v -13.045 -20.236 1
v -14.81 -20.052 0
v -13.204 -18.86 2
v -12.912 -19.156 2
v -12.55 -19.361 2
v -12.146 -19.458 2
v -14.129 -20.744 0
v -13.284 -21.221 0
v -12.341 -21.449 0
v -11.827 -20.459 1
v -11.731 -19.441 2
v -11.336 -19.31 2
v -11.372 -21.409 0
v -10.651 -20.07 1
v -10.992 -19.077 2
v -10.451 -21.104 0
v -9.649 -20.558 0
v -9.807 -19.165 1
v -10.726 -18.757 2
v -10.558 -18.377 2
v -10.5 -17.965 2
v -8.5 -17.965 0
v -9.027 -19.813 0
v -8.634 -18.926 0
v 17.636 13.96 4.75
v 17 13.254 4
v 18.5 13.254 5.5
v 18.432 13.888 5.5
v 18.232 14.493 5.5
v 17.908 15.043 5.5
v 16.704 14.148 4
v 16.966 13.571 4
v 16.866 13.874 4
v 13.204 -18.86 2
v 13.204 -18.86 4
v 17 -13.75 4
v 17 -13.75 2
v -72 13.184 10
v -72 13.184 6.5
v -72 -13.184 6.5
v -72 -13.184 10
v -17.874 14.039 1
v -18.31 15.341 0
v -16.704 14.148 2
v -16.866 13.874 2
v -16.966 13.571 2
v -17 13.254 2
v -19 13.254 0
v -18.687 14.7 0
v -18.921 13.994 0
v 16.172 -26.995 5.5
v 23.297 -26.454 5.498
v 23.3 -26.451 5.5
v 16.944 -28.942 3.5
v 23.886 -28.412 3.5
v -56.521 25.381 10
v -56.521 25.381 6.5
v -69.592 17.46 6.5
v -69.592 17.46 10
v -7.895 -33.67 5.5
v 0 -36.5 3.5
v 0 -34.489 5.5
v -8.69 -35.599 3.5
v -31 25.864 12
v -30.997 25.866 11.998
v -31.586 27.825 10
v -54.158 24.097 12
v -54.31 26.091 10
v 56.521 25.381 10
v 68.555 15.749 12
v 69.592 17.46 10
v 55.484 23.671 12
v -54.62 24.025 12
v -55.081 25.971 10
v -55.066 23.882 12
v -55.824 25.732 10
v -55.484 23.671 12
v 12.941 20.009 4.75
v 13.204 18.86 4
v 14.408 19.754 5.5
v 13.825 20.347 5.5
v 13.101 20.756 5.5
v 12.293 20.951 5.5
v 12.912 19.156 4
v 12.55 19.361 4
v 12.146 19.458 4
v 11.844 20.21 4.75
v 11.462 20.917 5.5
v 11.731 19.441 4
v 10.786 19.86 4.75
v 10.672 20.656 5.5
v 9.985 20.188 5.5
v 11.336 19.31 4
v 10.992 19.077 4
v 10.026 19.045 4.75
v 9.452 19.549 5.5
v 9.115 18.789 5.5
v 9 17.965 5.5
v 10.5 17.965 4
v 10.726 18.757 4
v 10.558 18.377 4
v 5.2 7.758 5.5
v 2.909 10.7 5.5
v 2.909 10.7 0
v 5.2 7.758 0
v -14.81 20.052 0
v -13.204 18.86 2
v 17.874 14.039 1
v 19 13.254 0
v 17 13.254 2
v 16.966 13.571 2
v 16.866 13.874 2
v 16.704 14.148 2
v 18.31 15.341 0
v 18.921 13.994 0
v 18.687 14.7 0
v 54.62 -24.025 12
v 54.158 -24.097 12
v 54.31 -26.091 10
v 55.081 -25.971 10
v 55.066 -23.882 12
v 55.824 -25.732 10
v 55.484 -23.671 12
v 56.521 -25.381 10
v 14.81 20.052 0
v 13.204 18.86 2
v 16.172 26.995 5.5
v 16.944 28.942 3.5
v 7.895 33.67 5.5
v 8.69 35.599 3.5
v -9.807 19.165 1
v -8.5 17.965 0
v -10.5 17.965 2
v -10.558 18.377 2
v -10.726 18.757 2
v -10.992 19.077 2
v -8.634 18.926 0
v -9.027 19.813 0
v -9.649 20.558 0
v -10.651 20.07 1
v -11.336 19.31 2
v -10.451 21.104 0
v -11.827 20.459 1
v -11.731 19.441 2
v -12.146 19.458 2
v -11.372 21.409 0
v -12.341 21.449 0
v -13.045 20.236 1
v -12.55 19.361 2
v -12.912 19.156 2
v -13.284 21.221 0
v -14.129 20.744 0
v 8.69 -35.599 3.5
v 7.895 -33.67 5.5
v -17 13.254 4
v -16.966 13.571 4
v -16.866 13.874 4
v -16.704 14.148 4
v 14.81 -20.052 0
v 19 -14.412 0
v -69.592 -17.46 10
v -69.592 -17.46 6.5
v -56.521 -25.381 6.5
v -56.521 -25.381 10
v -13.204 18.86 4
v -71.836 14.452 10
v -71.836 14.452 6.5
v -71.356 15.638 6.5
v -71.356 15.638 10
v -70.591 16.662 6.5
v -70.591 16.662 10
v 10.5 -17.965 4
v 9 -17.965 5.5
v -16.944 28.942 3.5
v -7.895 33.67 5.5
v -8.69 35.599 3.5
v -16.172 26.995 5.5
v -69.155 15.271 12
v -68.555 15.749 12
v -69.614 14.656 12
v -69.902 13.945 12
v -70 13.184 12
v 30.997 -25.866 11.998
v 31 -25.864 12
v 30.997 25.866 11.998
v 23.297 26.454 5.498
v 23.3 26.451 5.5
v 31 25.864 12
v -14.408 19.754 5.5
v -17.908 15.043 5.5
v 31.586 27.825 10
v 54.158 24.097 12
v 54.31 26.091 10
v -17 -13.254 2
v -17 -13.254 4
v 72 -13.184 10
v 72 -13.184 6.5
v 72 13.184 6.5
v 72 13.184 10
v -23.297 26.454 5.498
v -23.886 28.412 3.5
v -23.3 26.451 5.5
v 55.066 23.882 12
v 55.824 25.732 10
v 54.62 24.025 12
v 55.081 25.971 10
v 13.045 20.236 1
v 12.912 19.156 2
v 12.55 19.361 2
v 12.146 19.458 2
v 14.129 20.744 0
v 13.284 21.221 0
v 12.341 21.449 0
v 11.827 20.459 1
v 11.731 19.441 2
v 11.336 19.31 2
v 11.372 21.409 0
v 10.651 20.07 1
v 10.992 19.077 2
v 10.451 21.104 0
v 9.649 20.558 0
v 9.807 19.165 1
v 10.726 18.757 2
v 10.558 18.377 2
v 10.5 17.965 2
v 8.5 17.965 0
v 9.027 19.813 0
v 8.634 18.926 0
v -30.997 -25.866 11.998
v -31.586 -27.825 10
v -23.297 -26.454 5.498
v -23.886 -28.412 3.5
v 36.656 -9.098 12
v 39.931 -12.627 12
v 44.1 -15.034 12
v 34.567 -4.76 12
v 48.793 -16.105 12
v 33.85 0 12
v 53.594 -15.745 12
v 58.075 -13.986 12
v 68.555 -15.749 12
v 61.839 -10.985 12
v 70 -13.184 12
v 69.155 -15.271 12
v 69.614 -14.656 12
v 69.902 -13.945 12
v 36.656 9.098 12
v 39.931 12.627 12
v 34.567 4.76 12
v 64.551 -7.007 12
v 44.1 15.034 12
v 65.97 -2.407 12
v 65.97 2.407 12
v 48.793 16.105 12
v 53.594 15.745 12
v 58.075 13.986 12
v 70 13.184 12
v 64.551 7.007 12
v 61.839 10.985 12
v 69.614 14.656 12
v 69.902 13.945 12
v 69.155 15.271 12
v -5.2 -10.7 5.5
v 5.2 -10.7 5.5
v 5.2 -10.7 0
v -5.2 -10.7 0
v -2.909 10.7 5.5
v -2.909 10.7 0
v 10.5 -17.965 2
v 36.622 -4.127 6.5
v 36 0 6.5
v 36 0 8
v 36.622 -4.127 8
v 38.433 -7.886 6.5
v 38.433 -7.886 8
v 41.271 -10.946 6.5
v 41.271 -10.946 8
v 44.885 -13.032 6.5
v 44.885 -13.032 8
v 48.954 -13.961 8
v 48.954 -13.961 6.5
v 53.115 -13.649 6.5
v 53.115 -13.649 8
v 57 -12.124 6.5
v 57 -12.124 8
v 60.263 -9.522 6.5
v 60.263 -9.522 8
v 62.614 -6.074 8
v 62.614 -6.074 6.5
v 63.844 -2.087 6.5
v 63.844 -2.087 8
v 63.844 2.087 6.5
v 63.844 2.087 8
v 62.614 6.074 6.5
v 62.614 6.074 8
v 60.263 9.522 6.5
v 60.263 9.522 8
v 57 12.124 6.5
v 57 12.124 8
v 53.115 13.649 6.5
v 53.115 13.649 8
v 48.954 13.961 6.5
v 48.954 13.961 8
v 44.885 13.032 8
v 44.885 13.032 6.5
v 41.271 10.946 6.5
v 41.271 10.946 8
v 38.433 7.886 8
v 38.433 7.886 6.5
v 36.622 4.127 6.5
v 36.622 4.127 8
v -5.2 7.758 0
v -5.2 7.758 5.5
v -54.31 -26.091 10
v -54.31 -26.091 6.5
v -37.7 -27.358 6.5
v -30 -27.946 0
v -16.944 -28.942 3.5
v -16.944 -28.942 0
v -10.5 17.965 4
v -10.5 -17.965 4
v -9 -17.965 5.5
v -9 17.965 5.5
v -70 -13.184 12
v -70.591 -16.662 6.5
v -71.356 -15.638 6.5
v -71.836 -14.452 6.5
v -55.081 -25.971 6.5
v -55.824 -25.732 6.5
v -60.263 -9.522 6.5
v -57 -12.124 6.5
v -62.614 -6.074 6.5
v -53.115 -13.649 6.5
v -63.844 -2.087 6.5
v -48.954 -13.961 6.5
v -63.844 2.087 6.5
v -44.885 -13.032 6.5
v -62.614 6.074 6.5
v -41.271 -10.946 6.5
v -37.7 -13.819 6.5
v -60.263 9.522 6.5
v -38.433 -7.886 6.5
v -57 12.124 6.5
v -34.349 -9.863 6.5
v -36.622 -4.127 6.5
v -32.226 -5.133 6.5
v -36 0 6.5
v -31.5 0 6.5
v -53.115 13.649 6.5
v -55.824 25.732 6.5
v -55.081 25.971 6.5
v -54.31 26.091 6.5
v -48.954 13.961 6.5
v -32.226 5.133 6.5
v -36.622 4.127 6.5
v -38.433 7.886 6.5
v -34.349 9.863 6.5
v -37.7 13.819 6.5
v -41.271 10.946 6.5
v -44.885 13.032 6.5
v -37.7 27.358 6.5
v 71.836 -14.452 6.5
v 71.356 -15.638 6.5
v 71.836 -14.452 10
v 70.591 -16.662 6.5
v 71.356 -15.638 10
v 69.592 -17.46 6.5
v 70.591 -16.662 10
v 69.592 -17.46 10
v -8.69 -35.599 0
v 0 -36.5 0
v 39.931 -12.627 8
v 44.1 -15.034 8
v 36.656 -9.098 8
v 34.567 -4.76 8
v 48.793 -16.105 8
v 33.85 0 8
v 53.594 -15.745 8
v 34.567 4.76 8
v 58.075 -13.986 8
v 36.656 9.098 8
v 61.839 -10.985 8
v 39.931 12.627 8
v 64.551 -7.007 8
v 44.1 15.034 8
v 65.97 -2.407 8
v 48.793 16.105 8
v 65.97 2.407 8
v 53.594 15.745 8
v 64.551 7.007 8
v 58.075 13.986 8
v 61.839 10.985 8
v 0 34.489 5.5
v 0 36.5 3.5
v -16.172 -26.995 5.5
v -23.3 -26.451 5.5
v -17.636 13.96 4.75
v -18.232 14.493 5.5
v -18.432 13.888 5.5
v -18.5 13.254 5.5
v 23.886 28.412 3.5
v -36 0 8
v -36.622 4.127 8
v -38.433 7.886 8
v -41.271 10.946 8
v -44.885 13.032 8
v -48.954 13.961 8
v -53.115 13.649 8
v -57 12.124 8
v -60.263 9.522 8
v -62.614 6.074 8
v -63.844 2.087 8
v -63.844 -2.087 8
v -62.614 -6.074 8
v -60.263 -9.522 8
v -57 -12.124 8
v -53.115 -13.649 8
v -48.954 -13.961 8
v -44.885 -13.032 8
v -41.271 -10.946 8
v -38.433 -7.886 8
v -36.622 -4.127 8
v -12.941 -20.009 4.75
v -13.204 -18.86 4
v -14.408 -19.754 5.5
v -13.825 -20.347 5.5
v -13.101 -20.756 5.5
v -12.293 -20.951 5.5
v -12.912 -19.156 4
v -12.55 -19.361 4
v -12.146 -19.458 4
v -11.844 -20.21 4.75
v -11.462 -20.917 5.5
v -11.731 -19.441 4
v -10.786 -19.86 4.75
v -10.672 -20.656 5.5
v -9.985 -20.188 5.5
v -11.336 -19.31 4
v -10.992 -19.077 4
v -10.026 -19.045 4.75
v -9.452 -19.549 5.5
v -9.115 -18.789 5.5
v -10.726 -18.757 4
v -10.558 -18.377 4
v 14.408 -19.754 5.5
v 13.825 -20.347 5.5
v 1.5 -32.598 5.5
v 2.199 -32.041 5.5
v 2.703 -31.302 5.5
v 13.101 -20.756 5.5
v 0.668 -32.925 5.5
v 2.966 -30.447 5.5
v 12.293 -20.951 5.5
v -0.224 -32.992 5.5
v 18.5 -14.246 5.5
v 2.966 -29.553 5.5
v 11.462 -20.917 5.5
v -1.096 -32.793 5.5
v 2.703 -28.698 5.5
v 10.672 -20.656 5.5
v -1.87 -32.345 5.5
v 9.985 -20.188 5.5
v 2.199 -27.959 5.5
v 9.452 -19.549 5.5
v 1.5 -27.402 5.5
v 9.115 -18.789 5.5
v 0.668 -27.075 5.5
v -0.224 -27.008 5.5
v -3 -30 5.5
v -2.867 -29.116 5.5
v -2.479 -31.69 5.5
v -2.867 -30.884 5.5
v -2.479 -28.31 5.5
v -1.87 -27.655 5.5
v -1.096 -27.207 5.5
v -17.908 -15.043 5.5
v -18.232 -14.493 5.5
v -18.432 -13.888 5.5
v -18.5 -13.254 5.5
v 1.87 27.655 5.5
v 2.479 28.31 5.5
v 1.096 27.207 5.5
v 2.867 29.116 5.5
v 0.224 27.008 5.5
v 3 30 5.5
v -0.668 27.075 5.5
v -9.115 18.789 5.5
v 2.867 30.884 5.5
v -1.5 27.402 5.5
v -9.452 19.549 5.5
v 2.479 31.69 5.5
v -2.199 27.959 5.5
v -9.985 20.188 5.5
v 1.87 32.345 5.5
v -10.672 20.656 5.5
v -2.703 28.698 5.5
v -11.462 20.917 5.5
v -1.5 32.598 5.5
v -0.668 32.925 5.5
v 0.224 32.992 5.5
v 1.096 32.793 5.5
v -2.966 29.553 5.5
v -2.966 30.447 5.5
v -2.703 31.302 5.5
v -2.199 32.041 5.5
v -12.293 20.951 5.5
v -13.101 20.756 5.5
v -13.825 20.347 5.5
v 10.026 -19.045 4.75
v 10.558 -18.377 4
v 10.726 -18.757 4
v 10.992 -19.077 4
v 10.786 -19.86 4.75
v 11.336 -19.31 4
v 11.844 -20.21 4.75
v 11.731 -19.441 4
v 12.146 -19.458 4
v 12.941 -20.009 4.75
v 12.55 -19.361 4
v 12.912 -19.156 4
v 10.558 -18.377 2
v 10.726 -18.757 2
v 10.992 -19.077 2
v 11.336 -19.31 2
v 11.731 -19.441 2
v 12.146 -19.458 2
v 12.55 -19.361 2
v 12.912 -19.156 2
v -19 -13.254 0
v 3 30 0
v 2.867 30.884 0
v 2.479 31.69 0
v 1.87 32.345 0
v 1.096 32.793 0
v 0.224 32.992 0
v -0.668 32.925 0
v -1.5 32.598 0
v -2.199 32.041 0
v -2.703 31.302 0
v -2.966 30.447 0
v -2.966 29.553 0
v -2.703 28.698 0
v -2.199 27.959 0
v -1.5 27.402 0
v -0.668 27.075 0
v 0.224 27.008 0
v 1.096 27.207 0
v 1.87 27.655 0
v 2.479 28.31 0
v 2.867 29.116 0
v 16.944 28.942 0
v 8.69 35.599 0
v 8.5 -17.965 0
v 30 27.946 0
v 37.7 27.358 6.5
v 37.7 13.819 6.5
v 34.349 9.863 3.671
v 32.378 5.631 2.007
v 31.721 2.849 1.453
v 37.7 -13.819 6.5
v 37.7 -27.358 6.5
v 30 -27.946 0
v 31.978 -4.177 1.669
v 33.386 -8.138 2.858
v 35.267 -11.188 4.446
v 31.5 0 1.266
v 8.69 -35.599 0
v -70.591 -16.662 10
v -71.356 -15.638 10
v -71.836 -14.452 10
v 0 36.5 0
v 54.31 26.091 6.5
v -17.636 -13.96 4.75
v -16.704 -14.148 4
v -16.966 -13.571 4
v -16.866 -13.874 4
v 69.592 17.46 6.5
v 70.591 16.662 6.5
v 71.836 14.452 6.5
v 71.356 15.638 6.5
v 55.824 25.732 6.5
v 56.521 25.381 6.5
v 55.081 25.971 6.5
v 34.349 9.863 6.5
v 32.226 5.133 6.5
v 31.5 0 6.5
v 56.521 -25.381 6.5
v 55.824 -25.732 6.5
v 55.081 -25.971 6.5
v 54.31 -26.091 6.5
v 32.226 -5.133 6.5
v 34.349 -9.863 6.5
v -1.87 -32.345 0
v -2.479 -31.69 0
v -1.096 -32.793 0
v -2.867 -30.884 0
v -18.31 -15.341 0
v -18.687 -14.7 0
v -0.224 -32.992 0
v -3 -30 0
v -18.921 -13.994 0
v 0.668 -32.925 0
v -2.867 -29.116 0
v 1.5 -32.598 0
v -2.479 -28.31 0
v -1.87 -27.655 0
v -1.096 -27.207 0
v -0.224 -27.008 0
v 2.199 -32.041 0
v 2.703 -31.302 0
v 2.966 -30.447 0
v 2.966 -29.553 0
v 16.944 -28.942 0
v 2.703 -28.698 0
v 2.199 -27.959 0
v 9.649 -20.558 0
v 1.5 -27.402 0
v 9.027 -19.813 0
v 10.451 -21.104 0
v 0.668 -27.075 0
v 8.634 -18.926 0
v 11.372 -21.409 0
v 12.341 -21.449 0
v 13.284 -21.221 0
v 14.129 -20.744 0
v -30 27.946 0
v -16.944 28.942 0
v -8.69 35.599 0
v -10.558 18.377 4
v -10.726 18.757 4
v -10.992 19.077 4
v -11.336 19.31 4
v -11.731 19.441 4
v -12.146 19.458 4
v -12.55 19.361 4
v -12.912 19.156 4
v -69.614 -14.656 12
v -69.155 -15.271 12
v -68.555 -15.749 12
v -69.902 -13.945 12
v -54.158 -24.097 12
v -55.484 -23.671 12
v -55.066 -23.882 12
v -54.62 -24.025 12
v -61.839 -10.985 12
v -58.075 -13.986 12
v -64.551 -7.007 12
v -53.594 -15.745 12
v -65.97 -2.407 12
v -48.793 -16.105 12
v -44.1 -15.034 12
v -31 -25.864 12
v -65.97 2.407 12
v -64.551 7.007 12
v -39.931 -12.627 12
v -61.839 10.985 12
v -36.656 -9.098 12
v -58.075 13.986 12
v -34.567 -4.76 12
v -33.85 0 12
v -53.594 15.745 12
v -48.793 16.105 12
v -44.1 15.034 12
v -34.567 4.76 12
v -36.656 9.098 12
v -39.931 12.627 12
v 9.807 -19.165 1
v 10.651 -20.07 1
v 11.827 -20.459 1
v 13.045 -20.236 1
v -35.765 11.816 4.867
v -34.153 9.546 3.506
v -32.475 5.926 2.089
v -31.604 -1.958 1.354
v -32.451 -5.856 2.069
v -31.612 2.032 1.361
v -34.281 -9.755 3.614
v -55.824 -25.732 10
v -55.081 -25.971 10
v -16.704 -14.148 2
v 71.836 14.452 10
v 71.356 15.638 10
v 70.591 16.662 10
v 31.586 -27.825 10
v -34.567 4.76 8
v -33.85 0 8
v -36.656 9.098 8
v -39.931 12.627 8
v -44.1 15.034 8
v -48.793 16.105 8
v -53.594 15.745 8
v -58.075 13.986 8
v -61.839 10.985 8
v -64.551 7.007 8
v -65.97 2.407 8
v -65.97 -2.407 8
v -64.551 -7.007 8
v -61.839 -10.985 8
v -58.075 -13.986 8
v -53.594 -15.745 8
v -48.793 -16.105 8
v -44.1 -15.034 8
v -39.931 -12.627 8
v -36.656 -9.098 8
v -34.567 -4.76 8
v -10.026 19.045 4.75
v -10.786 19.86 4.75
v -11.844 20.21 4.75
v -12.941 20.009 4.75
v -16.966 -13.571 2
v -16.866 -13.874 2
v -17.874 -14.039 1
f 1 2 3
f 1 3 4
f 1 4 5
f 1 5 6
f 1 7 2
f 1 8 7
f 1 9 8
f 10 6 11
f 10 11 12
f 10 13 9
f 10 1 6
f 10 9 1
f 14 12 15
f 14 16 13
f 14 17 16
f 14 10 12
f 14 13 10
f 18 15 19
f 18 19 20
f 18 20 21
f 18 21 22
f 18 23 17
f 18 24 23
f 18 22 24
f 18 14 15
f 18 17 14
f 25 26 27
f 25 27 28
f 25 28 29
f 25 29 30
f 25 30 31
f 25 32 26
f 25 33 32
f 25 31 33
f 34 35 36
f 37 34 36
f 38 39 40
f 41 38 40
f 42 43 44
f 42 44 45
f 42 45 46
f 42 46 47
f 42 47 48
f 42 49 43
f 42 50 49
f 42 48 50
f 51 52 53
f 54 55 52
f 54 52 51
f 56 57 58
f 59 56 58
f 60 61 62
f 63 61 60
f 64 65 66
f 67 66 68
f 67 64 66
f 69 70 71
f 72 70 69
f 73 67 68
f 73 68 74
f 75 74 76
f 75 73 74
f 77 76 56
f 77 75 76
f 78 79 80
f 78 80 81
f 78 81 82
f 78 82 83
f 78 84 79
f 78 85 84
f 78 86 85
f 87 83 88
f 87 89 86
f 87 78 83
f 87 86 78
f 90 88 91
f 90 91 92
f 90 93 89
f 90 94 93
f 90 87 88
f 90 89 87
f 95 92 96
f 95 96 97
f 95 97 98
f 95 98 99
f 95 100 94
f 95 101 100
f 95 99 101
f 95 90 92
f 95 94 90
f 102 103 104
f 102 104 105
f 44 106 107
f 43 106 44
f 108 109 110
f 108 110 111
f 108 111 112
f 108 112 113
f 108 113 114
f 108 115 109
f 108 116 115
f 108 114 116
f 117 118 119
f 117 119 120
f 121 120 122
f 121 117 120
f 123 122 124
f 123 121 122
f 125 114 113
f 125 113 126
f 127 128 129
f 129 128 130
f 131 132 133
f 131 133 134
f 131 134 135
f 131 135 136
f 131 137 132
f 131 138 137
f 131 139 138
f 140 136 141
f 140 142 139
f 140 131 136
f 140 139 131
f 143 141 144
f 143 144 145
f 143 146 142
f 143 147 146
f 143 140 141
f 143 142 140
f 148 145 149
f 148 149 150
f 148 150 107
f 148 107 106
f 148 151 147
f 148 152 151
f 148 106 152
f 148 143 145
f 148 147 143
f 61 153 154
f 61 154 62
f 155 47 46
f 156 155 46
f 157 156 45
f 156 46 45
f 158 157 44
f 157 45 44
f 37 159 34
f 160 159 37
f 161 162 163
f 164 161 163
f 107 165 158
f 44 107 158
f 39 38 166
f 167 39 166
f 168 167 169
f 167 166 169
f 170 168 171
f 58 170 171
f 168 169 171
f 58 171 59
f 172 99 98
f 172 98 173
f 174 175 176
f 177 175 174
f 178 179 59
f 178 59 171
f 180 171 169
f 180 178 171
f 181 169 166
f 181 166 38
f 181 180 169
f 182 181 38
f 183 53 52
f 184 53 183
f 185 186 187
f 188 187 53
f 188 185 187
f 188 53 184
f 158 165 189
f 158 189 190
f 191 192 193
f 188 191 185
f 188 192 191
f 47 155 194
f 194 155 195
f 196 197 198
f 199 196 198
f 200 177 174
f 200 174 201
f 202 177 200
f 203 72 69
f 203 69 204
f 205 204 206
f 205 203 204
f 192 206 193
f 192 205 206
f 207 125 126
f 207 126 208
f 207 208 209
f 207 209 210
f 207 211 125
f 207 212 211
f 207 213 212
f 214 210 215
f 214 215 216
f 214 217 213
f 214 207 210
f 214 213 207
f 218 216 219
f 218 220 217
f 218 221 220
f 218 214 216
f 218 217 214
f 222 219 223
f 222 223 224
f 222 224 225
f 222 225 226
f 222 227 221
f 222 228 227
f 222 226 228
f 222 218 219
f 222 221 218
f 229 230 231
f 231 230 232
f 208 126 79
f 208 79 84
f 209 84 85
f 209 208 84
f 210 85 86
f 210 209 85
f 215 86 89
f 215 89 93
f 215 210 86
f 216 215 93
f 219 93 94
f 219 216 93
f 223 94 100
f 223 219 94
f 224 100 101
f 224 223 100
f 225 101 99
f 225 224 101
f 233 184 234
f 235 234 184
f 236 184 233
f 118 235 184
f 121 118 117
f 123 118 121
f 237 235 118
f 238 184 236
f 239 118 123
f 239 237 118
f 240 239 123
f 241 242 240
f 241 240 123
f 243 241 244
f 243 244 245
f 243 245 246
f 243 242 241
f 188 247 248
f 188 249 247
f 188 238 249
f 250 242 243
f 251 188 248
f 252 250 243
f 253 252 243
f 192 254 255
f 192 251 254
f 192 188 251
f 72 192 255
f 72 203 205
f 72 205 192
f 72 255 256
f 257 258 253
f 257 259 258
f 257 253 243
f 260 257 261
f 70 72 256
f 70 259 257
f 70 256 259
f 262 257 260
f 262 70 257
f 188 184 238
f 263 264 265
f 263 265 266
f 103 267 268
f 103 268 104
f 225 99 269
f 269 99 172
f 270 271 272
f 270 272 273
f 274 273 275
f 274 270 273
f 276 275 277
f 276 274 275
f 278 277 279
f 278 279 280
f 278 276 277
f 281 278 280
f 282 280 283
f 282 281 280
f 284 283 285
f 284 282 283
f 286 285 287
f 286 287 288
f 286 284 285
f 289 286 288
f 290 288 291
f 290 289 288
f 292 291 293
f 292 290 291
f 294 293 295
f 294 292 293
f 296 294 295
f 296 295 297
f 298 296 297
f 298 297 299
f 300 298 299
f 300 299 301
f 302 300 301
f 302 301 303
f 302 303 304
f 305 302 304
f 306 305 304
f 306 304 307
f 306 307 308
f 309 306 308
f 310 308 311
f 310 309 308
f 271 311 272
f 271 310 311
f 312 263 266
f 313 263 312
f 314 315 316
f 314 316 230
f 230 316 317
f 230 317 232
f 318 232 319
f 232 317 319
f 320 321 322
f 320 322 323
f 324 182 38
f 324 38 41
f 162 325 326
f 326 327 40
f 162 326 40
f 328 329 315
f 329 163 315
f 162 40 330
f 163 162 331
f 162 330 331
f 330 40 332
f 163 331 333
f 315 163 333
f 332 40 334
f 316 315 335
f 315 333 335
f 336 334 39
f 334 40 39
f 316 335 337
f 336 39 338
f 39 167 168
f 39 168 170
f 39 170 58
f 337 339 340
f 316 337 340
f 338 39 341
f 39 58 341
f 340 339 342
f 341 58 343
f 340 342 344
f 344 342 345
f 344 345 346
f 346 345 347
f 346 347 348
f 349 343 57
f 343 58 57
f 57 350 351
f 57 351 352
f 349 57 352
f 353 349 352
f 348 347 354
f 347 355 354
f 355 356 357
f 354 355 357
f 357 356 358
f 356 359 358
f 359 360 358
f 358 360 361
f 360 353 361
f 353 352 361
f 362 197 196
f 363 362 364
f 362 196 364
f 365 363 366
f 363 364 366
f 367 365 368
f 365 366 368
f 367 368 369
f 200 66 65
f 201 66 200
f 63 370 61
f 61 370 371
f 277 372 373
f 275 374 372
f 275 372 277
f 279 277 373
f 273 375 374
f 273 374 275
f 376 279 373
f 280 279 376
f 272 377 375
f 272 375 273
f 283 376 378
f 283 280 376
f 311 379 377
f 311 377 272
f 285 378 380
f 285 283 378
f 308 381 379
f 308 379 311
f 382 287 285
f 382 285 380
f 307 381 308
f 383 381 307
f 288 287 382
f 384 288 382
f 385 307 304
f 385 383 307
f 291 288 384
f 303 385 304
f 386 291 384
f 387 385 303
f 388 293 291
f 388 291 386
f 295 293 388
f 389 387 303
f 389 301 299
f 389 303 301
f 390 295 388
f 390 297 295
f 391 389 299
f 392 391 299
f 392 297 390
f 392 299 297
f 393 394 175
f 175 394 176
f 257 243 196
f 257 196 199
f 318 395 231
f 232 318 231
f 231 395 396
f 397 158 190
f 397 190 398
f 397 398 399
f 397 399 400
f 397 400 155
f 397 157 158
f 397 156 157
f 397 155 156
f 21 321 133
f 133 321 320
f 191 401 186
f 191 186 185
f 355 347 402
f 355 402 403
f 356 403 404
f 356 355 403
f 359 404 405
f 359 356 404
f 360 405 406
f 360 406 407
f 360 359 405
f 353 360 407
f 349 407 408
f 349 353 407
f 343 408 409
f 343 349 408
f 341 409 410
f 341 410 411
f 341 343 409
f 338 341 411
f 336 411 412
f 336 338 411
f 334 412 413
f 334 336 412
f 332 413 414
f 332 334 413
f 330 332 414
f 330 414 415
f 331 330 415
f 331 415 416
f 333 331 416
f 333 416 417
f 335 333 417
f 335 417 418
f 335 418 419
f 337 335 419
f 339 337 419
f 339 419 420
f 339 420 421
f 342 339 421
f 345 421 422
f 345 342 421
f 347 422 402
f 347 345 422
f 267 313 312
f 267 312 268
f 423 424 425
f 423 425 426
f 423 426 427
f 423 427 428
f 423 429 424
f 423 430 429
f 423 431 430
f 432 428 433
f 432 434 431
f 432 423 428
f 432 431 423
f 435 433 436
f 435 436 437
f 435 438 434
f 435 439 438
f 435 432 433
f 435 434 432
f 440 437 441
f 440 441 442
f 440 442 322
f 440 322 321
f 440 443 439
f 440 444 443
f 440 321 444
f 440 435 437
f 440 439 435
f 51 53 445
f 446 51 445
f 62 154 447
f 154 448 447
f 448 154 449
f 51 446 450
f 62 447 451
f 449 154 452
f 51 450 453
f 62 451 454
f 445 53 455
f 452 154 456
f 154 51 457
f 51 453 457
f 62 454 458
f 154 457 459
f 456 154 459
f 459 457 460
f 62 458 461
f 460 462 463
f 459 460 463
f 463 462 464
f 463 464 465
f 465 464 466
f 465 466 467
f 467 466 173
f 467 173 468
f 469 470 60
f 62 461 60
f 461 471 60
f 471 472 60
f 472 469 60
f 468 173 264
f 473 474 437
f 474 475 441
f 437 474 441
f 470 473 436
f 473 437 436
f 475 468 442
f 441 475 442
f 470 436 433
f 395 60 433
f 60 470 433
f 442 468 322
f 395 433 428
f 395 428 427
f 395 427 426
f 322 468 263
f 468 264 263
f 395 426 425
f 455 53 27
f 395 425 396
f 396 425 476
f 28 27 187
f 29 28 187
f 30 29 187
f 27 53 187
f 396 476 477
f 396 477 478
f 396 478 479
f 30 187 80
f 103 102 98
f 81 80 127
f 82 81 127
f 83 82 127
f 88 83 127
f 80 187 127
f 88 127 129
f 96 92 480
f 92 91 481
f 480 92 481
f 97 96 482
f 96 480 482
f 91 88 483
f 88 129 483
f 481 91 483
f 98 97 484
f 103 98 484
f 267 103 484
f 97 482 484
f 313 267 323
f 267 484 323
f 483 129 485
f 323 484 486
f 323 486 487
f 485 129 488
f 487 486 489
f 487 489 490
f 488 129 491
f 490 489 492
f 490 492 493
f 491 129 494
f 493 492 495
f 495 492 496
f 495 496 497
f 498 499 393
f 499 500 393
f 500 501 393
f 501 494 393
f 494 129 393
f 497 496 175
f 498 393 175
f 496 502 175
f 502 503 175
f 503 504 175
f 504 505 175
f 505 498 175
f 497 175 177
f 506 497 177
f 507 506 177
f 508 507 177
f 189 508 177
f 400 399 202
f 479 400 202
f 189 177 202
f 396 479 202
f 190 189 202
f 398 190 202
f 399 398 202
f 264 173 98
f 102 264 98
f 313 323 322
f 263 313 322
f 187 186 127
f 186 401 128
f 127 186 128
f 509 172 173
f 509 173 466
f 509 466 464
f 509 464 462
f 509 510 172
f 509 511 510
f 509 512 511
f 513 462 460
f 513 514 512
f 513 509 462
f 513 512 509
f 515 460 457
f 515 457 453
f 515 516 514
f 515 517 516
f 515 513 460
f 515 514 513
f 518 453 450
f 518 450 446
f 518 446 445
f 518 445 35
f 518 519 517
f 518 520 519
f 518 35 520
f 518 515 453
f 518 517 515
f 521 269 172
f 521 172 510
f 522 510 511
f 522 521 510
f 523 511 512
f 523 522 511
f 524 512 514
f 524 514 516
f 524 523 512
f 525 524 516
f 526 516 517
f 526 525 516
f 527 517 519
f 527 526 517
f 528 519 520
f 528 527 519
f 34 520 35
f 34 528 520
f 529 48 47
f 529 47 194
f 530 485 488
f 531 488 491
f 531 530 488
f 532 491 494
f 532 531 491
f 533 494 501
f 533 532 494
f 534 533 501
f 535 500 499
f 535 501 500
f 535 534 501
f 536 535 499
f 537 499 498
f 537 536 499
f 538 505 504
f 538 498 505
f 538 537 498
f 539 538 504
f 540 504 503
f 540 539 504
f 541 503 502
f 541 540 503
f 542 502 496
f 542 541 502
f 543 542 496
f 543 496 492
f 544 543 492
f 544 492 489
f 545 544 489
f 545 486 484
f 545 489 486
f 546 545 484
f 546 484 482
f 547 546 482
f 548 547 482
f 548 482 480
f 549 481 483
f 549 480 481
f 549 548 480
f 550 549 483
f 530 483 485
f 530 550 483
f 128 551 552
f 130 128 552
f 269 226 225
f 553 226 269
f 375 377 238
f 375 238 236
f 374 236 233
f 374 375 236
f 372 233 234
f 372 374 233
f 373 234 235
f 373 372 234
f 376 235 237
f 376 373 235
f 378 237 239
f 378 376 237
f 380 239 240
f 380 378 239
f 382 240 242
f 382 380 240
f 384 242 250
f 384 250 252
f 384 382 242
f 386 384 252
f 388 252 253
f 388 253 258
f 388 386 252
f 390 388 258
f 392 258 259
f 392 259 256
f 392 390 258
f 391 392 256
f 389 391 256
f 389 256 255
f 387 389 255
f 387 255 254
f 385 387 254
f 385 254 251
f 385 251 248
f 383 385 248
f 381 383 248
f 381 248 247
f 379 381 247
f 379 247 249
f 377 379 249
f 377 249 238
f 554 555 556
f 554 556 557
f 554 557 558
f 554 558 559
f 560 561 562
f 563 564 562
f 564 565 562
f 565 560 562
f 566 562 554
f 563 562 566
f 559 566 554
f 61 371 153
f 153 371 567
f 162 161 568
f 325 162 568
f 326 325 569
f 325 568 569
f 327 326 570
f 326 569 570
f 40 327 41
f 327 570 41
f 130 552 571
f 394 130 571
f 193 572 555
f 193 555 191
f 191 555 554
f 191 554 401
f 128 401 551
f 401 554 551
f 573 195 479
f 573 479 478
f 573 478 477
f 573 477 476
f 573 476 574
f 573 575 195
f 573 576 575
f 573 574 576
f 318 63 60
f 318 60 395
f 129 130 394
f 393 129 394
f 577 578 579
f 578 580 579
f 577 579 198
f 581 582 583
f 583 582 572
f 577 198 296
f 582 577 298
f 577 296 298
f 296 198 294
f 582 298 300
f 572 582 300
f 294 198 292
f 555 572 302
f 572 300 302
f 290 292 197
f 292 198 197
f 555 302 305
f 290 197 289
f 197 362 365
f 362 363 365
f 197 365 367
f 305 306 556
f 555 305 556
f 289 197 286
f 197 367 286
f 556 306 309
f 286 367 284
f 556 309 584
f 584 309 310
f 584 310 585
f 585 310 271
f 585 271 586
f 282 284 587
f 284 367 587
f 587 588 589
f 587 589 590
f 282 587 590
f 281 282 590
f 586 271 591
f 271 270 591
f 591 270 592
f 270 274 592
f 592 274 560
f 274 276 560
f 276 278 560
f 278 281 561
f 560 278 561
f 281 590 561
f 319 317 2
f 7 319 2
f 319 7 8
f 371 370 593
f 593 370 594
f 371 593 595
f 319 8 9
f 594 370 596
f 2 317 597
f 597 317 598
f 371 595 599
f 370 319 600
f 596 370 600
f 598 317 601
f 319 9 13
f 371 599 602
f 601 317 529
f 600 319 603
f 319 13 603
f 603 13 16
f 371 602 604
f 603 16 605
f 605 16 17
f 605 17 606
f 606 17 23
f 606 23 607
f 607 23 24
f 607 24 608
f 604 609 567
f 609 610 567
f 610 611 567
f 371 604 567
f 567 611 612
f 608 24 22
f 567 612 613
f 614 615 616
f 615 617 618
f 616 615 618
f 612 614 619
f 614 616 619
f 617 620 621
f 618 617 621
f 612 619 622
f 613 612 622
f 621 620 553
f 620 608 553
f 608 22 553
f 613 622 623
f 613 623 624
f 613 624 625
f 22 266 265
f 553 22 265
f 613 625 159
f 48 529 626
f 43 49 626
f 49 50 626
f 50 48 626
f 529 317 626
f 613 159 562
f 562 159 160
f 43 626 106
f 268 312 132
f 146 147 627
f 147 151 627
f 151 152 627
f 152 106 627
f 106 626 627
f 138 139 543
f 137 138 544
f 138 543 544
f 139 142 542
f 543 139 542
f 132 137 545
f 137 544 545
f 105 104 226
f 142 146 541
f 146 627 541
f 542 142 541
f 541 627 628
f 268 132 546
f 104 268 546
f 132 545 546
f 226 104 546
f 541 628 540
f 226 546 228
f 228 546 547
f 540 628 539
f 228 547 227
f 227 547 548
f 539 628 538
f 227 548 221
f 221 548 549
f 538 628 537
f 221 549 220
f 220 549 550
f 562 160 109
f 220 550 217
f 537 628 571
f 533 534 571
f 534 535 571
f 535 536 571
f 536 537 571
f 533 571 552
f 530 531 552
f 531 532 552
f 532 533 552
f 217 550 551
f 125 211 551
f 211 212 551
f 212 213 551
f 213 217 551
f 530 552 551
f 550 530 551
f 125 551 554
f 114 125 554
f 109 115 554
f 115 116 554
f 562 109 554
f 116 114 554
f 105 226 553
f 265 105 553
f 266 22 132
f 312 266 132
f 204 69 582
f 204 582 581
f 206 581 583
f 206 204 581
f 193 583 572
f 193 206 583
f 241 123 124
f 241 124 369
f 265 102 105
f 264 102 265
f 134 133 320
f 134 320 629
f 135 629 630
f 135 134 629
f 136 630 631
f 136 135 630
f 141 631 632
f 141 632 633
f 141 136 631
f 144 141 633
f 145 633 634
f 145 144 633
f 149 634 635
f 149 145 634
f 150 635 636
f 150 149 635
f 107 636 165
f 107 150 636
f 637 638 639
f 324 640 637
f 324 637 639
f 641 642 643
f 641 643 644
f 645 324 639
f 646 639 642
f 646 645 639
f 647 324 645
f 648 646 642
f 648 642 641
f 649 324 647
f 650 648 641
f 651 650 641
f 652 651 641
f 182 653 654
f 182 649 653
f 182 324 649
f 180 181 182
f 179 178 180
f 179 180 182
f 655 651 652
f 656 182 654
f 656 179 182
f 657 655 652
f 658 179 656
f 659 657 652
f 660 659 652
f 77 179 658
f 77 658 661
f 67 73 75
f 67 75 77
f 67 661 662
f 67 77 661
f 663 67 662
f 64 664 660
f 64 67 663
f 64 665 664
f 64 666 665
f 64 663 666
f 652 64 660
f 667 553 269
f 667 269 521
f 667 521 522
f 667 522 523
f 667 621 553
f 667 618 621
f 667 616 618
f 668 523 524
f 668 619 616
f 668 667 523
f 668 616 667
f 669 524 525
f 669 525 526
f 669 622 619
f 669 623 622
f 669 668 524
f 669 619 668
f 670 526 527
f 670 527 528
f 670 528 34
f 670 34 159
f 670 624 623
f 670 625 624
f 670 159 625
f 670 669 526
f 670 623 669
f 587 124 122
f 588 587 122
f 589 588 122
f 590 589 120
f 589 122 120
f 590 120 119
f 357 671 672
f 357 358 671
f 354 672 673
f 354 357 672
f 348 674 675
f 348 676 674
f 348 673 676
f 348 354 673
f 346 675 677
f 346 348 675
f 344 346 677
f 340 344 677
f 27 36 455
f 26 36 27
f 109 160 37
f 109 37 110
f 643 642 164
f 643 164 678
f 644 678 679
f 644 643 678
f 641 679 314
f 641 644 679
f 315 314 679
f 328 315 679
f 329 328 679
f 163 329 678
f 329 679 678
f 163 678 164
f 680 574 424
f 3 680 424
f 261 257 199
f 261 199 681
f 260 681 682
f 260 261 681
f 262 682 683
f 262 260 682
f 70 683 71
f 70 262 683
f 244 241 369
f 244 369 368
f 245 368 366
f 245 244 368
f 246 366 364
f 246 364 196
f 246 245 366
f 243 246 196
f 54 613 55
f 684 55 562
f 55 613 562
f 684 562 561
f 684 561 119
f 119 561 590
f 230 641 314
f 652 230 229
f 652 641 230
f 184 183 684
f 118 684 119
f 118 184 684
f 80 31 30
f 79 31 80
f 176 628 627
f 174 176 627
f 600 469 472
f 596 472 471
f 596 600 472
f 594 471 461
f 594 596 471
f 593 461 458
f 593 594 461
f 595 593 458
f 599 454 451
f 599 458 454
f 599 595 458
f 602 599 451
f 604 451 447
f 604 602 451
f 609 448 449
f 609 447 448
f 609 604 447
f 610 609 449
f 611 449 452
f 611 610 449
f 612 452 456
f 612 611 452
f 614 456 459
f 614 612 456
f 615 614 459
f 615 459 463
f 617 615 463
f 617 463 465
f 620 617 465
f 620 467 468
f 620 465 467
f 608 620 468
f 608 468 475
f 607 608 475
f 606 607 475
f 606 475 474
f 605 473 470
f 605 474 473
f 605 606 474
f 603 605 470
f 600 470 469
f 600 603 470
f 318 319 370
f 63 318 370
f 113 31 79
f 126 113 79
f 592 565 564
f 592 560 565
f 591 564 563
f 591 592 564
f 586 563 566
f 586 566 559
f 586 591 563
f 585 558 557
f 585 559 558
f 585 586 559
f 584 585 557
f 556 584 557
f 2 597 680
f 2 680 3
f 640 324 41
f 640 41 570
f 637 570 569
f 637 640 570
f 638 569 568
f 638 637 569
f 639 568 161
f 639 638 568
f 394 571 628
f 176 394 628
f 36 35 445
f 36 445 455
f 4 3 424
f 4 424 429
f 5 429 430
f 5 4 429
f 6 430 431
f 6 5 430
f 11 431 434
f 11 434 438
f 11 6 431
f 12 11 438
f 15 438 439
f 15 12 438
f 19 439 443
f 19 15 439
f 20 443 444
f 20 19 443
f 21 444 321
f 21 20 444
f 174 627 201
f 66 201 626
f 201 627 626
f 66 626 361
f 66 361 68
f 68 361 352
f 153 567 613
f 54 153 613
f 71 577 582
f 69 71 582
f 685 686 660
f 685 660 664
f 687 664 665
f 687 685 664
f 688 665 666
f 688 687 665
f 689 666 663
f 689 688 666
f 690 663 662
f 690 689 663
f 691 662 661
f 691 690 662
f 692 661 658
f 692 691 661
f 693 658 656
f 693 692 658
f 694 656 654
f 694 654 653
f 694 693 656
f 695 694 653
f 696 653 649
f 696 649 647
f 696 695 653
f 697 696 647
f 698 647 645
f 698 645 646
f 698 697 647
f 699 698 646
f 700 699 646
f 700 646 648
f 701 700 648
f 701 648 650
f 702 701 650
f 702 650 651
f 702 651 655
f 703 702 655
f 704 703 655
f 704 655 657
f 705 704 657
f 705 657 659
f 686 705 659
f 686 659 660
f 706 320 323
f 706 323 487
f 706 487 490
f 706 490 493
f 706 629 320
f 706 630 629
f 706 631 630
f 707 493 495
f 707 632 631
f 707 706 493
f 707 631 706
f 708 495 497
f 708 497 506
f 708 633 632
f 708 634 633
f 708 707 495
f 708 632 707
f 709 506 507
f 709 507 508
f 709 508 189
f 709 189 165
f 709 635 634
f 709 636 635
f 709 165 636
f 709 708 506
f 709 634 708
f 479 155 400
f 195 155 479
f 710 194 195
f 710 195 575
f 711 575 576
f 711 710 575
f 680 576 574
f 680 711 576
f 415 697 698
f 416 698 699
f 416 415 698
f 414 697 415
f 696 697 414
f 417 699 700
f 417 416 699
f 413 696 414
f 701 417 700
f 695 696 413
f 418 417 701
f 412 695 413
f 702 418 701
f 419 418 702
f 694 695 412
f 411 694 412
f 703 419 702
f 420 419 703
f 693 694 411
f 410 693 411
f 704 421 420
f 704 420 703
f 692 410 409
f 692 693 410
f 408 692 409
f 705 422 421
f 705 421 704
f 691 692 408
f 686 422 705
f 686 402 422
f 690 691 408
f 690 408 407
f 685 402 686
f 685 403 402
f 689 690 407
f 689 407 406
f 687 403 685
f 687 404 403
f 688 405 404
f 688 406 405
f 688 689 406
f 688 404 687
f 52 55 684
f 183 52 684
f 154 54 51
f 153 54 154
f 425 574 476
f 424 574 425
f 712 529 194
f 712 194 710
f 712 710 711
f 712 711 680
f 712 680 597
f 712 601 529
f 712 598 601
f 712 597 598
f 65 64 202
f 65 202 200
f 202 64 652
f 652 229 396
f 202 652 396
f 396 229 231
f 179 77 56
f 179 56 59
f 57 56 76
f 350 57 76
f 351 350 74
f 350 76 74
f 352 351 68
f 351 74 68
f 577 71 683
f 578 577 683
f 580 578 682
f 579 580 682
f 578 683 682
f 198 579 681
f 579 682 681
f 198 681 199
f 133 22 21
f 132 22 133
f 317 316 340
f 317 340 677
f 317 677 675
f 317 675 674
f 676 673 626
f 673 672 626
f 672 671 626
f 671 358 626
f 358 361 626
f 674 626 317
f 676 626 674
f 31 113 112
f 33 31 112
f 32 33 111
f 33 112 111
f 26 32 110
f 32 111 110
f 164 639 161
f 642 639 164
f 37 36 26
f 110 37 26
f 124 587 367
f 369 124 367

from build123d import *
from OCP.BRepFilletAPI import BRepFilletAPI_MakeChamfer

# Parameters (mm, degrees)
SKETCH1_R               = 3
SKETCH1_R_2             = 16.15
BOSS_EXTRUDE1_DEPTH     = 12
CUT_EXTRUDE1_DEPTH      = 82.610354735
CUT_EXTRUDE1_DEPTH_BACK = 82.610354735
CUT_EXTRUDE2_DEPTH      = 81.984566431
CUT_EXTRUDE2_DEPTH_BACK = 81.984566431
CUT_EXTRUDE3_DEPTH      = 81.984566431
CUT_EXTRUDE3_DEPTH_BACK = 81.984566431
FILLET1_R               = 1.5
SKETCH5_R               = 18.073165259
SKETCH5_R_2             = 14
BOSS_EXTRUDE2_DEPTH     = 1.5
FILLET2_R               = 5
CHAMFER1_SIZE           = 2
CHAMFER1_SIZE2          = 1.908627476
SKETCH7_R               = 18.5
CUT_EXTRUDE4_DEPTH      = 81.984566431
CHAMFER2_SIZE           = 2
CHAMFER3_SIZE           = 1.5


with BuildPart() as part:
    # Sketch1 → Boss-Extrude1 (new body)
    with BuildSketch(Plane.XY):
        Polygon((-72, 16), (-72, -16), (-55.5, -26), (-16.944232072, -28.942026003), (-8.689847933, -35.598787405), (0, -36.5), (8.689847933, -35.598787405), (16.944232072, -28.942026003), (55.5, -26), (72, -16), (72, 16), (55.5, 26), (16.944232072, 28.942026003), (8.689847933, 35.598787405), (0, 36.5), (-8.689847933, 35.598787405), (-16.944232072, 28.942026003), (-55.5, 26), align=None)
        with Locations((0, 30)):
            Circle(SKETCH1_R, mode=Mode.SUBTRACT)
        with Locations((-50, 0)):
            Circle(SKETCH1_R_2, mode=Mode.SUBTRACT)
        with Locations(Location((0, -30, 0), (0, 0, 180))):
            Circle(SKETCH1_R, mode=Mode.SUBTRACT)
        with Locations(Location((50, 0, 0), (0, 0, 180))):
            Circle(SKETCH1_R_2, mode=Mode.SUBTRACT)
    extrude(amount=BOSS_EXTRUDE1_DEPTH)

    # Sketch2 → Cut-Extrude1 (cut, two sides)
    with BuildSketch(Plane(origin=(0, 0, 0), x_dir=(1, 0, 0), z_dir=(0, 1, 0))) as cut_extrude1_sk:
        Polygon((-31, -12), (-23.3, -5.5), (4.394576276, -5.5), (23.3, -5.5), (31, -12), align=None)
        Polygon((-72, 0), (-72, -6.5), (-37.7, -6.5), (-30, 0), align=None)
        Polygon((30, 0), (72, 0), (72, -6.5), (37.7, -6.5), align=None)
    extrude(amount=CUT_EXTRUDE1_DEPTH, mode=Mode.SUBTRACT)
    extrude(cut_extrude1_sk.sketch, amount=-CUT_EXTRUDE1_DEPTH_BACK, mode=Mode.SUBTRACT)

    # Sketch3 → Cut-Extrude2 (cut, two sides)
    with BuildSketch(Plane.XY.offset(5.5)) as cut_extrude2_sk:
        Polygon((5.2, -10.7), (-5.2, -10.7), (-5.2, 7.758003241), (-2.908652734, 10.7), (2.908652734, 10.7), (5.2, 7.758003241), align=None)
    extrude(amount=CUT_EXTRUDE2_DEPTH, mode=Mode.SUBTRACT)
    extrude(cut_extrude2_sk.sketch, amount=-CUT_EXTRUDE2_DEPTH_BACK, mode=Mode.SUBTRACT)

    # Sketch4 → Cut-Extrude3 (cut, two sides)
    with BuildSketch(Plane.XY.offset(5.5)) as cut_extrude3_sk:
        Polygon((-17, 13.75), (-17, -13.75), (-10.5, -22.5), (-10.5, 22.5), align=None)
        Polygon((17, 13.75), (10.5, 22.5), (10.5, -22.5), (17, -13.75), align=None)
    extrude(amount=CUT_EXTRUDE3_DEPTH, mode=Mode.SUBTRACT)
    extrude(cut_extrude3_sk.sketch, amount=-CUT_EXTRUDE3_DEPTH_BACK, mode=Mode.SUBTRACT)

    # Fillet1
    fillet1_edges = [part.edges().sort_by_distance(p)[0] for p in [
        (-10.5, -22.5, 2.75),
        (-17, -13.75, 2.75),
        (-17, 13.75, 2.75),
        (-10.5, 22.5, 2.75),
        (17, 13.75, 2.75),
        (10.5, -22.5, 2.75),
        (10.5, 22.5, 2.75),
    ]]
    fillet(fillet1_edges, radius=FILLET1_R)

    # Sketch5 → Boss-Extrude2 (add)
    with BuildSketch(Plane.XY.offset(6.5)):
        with Locations((-50, 0)):
            Circle(SKETCH5_R)
        with Locations((-50, 0)):
            Circle(SKETCH5_R_2, mode=Mode.SUBTRACT)
        with Locations((50, 0)):
            Circle(SKETCH5_R)
        with Locations(Location((50, 0, 0), (0, 0, 180))):
            Circle(SKETCH5_R_2, mode=Mode.SUBTRACT)
    extrude(amount=BOSS_EXTRUDE2_DEPTH)

    # Fillet2
    fillet2_edges = [part.edges().sort_by_distance(p)[0] for p in [
        (55.5, 26, 9.25),
        (72, 16, 9.25),
        (72, -16, 9.25),
        (55.5, -26, 9.25),
        (-55.5, -26, 9.25),
        (-72, -16, 9.25),
        (-72, 16, 9.25),
        (-55.5, 26, 9.25),
    ]]
    fillet(fillet2_edges, radius=FILLET2_R)

    # Chamfer1: one chamfer whose edges measure the first distance from different faces: ONE call of the kernel's chamfer builder (chamfer() names one face for all edges)
    chamfer1_edges_1 = [part.edges().sort_by_distance(p)[0] for p in [
        (-27.15, 28.163267435, 8.75),
        (-27.15, -28.163267435, 8.75),
    ]]
    chamfer1_side_1 = [part.faces().sort_by_distance(p)[0] for p in [
        (-27.136613276, 0, 8.738699519),
    ]]
    chamfer1_edges_2 = [part.edges().sort_by_distance(p)[0] for p in [
        (27.15, -28.163267435, 8.75),
        (27.15, 28.163267435, 8.75),
    ]]
    chamfer1_side_2 = [part.faces().sort_by_distance(p)[0] for p in [
        (27.136613276, 0, 8.738699519),
    ]]
    chamfer1_edges_3 = [part.edges().sort_by_distance(p)[0] for p in [
        (-12.817040003, -32.270406704, 5.5),
        (-20.122116036, -28.699535248, 5.5),
        (-20.122116036, 28.699535248, 5.5),
        (-12.817040003, 32.270406704, 5.5),
        (-4.344923967, 36.049393703, 5.5),
        (4.344923967, 36.049393703, 5.5),
        (12.817040003, 32.270406704, 5.5),
        (20.122116036, 28.699535248, 5.5),
        (20.122116036, -28.699535248, 5.5),
        (12.817040003, -32.270406704, 5.5),
        (4.344923967, -36.049393703, 5.5),
        (-4.344923967, -36.049393703, 5.5),
        (42.654881047, 26.980156174, 12),
        (63.056178259, 21.420498025, 12),
        (63.056178259, -21.420498025, 12),
        (72, 0, 12),
        (71.356463181, 15.637521788, 12),
        (71.356463181, -15.637521788, 12),
        (55.457065699, -25.866202879, 12),
        (55.457065699, 25.866202879, 12),
        (-42.654881047, -26.980156174, 12),
        (-63.056178259, -21.420498025, 12),
        (-63.056178259, 21.420498025, 12),
        (-72, 0, 12),
        (-71.356463181, 15.637521788, 12),
        (-71.356463181, -15.637521788, 12),
        (-55.457065699, 25.866202879, 12),
        (-55.457065699, -25.866202879, 12),
        (42.654881047, -26.980156174, 12),
        (-42.654881047, 26.980156174, 12),
    ]]
    chamfer1 = BRepFilletAPI_MakeChamfer(part.part.solid().wrapped)
    for e in chamfer1_edges_1:
        chamfer1.Add(CHAMFER1_SIZE, CHAMFER1_SIZE2, e.wrapped, chamfer1_side_1[0].wrapped)  # the first distance lies on this face
    for e in chamfer1_edges_2:
        chamfer1.Add(CHAMFER1_SIZE, CHAMFER1_SIZE2, e.wrapped, chamfer1_side_2[0].wrapped)  # the first distance lies on this face
    for e in chamfer1_edges_3:
        chamfer1.Add(CHAMFER1_SIZE, e.wrapped)
    add(Compound.cast(chamfer1.Shape()), mode=Mode.REPLACE)

    # Sketch7 → Cut-Extrude4 (cut, through all)
    with BuildSketch(Plane(origin=(0, 0, 6.5), x_dir=(-1, 0, 0), z_dir=(0, 0, -1))):
        with Locations((-50, 0)):
            Circle(SKETCH7_R)
        with Locations((50, 0)):
            Circle(SKETCH7_R)
    extrude(amount=CUT_EXTRUDE4_DEPTH, mode=Mode.SUBTRACT)

    # Chamfer2
    chamfer2_edges = [part.edges().sort_by_distance(p)[0] for p in [
        (17, -0.248090155, 0),
        (14.954115772, 16.504074922, 0),
        (10.5, 0, 0),
        (15.102057886, -16.304922077, 0),
        (-10.5, 0, 0),
        (-14.954115772, -16.504074922, 0),
        (-17, 0, 0),
        (-14.954115772, 16.504074922, 0),
        (16.924109135, 13.724896298, 0),
        (11.528923392, 19.389467286, 0),
        (11.528923392, -19.389467286, 0),
        (-11.528923392, -19.389467286, 0),
        (-16.924109135, -13.724896298, 0),
        (-16.924109135, 13.724896298, 0),
        (-11.528923392, 19.389467286, 0),
    ]]
    chamfer(chamfer2_edges, length=CHAMFER2_SIZE)

    # Chamfer3
    chamfer3_edges = [part.edges().sort_by_distance(p)[0] for p in [
        (15.102057886, -16.304922077, 5.5),
        (14.954115772, 16.504074922, 5.5),
        (17, -0.248090155, 5.5),
        (10.5, 0, 5.5),
        (-10.5, 0, 5.5),
        (-14.954115772, -16.504074922, 5.5),
        (-17, 0, 5.5),
        (-14.954115772, 16.504074922, 5.5),
        (16.924109135, 13.724896298, 5.5),
        (11.528923392, 19.389467286, 5.5),
        (11.528923392, -19.389467286, 5.5),
        (-11.528923392, -19.389467286, 5.5),
        (-16.924109135, -13.724896298, 5.5),
        (-16.924109135, 13.724896298, 5.5),
        (-11.528923392, 19.389467286, 5.5),
    ]]
    chamfer(chamfer3_edges, length=CHAMFER3_SIZE)


solid = part.part
